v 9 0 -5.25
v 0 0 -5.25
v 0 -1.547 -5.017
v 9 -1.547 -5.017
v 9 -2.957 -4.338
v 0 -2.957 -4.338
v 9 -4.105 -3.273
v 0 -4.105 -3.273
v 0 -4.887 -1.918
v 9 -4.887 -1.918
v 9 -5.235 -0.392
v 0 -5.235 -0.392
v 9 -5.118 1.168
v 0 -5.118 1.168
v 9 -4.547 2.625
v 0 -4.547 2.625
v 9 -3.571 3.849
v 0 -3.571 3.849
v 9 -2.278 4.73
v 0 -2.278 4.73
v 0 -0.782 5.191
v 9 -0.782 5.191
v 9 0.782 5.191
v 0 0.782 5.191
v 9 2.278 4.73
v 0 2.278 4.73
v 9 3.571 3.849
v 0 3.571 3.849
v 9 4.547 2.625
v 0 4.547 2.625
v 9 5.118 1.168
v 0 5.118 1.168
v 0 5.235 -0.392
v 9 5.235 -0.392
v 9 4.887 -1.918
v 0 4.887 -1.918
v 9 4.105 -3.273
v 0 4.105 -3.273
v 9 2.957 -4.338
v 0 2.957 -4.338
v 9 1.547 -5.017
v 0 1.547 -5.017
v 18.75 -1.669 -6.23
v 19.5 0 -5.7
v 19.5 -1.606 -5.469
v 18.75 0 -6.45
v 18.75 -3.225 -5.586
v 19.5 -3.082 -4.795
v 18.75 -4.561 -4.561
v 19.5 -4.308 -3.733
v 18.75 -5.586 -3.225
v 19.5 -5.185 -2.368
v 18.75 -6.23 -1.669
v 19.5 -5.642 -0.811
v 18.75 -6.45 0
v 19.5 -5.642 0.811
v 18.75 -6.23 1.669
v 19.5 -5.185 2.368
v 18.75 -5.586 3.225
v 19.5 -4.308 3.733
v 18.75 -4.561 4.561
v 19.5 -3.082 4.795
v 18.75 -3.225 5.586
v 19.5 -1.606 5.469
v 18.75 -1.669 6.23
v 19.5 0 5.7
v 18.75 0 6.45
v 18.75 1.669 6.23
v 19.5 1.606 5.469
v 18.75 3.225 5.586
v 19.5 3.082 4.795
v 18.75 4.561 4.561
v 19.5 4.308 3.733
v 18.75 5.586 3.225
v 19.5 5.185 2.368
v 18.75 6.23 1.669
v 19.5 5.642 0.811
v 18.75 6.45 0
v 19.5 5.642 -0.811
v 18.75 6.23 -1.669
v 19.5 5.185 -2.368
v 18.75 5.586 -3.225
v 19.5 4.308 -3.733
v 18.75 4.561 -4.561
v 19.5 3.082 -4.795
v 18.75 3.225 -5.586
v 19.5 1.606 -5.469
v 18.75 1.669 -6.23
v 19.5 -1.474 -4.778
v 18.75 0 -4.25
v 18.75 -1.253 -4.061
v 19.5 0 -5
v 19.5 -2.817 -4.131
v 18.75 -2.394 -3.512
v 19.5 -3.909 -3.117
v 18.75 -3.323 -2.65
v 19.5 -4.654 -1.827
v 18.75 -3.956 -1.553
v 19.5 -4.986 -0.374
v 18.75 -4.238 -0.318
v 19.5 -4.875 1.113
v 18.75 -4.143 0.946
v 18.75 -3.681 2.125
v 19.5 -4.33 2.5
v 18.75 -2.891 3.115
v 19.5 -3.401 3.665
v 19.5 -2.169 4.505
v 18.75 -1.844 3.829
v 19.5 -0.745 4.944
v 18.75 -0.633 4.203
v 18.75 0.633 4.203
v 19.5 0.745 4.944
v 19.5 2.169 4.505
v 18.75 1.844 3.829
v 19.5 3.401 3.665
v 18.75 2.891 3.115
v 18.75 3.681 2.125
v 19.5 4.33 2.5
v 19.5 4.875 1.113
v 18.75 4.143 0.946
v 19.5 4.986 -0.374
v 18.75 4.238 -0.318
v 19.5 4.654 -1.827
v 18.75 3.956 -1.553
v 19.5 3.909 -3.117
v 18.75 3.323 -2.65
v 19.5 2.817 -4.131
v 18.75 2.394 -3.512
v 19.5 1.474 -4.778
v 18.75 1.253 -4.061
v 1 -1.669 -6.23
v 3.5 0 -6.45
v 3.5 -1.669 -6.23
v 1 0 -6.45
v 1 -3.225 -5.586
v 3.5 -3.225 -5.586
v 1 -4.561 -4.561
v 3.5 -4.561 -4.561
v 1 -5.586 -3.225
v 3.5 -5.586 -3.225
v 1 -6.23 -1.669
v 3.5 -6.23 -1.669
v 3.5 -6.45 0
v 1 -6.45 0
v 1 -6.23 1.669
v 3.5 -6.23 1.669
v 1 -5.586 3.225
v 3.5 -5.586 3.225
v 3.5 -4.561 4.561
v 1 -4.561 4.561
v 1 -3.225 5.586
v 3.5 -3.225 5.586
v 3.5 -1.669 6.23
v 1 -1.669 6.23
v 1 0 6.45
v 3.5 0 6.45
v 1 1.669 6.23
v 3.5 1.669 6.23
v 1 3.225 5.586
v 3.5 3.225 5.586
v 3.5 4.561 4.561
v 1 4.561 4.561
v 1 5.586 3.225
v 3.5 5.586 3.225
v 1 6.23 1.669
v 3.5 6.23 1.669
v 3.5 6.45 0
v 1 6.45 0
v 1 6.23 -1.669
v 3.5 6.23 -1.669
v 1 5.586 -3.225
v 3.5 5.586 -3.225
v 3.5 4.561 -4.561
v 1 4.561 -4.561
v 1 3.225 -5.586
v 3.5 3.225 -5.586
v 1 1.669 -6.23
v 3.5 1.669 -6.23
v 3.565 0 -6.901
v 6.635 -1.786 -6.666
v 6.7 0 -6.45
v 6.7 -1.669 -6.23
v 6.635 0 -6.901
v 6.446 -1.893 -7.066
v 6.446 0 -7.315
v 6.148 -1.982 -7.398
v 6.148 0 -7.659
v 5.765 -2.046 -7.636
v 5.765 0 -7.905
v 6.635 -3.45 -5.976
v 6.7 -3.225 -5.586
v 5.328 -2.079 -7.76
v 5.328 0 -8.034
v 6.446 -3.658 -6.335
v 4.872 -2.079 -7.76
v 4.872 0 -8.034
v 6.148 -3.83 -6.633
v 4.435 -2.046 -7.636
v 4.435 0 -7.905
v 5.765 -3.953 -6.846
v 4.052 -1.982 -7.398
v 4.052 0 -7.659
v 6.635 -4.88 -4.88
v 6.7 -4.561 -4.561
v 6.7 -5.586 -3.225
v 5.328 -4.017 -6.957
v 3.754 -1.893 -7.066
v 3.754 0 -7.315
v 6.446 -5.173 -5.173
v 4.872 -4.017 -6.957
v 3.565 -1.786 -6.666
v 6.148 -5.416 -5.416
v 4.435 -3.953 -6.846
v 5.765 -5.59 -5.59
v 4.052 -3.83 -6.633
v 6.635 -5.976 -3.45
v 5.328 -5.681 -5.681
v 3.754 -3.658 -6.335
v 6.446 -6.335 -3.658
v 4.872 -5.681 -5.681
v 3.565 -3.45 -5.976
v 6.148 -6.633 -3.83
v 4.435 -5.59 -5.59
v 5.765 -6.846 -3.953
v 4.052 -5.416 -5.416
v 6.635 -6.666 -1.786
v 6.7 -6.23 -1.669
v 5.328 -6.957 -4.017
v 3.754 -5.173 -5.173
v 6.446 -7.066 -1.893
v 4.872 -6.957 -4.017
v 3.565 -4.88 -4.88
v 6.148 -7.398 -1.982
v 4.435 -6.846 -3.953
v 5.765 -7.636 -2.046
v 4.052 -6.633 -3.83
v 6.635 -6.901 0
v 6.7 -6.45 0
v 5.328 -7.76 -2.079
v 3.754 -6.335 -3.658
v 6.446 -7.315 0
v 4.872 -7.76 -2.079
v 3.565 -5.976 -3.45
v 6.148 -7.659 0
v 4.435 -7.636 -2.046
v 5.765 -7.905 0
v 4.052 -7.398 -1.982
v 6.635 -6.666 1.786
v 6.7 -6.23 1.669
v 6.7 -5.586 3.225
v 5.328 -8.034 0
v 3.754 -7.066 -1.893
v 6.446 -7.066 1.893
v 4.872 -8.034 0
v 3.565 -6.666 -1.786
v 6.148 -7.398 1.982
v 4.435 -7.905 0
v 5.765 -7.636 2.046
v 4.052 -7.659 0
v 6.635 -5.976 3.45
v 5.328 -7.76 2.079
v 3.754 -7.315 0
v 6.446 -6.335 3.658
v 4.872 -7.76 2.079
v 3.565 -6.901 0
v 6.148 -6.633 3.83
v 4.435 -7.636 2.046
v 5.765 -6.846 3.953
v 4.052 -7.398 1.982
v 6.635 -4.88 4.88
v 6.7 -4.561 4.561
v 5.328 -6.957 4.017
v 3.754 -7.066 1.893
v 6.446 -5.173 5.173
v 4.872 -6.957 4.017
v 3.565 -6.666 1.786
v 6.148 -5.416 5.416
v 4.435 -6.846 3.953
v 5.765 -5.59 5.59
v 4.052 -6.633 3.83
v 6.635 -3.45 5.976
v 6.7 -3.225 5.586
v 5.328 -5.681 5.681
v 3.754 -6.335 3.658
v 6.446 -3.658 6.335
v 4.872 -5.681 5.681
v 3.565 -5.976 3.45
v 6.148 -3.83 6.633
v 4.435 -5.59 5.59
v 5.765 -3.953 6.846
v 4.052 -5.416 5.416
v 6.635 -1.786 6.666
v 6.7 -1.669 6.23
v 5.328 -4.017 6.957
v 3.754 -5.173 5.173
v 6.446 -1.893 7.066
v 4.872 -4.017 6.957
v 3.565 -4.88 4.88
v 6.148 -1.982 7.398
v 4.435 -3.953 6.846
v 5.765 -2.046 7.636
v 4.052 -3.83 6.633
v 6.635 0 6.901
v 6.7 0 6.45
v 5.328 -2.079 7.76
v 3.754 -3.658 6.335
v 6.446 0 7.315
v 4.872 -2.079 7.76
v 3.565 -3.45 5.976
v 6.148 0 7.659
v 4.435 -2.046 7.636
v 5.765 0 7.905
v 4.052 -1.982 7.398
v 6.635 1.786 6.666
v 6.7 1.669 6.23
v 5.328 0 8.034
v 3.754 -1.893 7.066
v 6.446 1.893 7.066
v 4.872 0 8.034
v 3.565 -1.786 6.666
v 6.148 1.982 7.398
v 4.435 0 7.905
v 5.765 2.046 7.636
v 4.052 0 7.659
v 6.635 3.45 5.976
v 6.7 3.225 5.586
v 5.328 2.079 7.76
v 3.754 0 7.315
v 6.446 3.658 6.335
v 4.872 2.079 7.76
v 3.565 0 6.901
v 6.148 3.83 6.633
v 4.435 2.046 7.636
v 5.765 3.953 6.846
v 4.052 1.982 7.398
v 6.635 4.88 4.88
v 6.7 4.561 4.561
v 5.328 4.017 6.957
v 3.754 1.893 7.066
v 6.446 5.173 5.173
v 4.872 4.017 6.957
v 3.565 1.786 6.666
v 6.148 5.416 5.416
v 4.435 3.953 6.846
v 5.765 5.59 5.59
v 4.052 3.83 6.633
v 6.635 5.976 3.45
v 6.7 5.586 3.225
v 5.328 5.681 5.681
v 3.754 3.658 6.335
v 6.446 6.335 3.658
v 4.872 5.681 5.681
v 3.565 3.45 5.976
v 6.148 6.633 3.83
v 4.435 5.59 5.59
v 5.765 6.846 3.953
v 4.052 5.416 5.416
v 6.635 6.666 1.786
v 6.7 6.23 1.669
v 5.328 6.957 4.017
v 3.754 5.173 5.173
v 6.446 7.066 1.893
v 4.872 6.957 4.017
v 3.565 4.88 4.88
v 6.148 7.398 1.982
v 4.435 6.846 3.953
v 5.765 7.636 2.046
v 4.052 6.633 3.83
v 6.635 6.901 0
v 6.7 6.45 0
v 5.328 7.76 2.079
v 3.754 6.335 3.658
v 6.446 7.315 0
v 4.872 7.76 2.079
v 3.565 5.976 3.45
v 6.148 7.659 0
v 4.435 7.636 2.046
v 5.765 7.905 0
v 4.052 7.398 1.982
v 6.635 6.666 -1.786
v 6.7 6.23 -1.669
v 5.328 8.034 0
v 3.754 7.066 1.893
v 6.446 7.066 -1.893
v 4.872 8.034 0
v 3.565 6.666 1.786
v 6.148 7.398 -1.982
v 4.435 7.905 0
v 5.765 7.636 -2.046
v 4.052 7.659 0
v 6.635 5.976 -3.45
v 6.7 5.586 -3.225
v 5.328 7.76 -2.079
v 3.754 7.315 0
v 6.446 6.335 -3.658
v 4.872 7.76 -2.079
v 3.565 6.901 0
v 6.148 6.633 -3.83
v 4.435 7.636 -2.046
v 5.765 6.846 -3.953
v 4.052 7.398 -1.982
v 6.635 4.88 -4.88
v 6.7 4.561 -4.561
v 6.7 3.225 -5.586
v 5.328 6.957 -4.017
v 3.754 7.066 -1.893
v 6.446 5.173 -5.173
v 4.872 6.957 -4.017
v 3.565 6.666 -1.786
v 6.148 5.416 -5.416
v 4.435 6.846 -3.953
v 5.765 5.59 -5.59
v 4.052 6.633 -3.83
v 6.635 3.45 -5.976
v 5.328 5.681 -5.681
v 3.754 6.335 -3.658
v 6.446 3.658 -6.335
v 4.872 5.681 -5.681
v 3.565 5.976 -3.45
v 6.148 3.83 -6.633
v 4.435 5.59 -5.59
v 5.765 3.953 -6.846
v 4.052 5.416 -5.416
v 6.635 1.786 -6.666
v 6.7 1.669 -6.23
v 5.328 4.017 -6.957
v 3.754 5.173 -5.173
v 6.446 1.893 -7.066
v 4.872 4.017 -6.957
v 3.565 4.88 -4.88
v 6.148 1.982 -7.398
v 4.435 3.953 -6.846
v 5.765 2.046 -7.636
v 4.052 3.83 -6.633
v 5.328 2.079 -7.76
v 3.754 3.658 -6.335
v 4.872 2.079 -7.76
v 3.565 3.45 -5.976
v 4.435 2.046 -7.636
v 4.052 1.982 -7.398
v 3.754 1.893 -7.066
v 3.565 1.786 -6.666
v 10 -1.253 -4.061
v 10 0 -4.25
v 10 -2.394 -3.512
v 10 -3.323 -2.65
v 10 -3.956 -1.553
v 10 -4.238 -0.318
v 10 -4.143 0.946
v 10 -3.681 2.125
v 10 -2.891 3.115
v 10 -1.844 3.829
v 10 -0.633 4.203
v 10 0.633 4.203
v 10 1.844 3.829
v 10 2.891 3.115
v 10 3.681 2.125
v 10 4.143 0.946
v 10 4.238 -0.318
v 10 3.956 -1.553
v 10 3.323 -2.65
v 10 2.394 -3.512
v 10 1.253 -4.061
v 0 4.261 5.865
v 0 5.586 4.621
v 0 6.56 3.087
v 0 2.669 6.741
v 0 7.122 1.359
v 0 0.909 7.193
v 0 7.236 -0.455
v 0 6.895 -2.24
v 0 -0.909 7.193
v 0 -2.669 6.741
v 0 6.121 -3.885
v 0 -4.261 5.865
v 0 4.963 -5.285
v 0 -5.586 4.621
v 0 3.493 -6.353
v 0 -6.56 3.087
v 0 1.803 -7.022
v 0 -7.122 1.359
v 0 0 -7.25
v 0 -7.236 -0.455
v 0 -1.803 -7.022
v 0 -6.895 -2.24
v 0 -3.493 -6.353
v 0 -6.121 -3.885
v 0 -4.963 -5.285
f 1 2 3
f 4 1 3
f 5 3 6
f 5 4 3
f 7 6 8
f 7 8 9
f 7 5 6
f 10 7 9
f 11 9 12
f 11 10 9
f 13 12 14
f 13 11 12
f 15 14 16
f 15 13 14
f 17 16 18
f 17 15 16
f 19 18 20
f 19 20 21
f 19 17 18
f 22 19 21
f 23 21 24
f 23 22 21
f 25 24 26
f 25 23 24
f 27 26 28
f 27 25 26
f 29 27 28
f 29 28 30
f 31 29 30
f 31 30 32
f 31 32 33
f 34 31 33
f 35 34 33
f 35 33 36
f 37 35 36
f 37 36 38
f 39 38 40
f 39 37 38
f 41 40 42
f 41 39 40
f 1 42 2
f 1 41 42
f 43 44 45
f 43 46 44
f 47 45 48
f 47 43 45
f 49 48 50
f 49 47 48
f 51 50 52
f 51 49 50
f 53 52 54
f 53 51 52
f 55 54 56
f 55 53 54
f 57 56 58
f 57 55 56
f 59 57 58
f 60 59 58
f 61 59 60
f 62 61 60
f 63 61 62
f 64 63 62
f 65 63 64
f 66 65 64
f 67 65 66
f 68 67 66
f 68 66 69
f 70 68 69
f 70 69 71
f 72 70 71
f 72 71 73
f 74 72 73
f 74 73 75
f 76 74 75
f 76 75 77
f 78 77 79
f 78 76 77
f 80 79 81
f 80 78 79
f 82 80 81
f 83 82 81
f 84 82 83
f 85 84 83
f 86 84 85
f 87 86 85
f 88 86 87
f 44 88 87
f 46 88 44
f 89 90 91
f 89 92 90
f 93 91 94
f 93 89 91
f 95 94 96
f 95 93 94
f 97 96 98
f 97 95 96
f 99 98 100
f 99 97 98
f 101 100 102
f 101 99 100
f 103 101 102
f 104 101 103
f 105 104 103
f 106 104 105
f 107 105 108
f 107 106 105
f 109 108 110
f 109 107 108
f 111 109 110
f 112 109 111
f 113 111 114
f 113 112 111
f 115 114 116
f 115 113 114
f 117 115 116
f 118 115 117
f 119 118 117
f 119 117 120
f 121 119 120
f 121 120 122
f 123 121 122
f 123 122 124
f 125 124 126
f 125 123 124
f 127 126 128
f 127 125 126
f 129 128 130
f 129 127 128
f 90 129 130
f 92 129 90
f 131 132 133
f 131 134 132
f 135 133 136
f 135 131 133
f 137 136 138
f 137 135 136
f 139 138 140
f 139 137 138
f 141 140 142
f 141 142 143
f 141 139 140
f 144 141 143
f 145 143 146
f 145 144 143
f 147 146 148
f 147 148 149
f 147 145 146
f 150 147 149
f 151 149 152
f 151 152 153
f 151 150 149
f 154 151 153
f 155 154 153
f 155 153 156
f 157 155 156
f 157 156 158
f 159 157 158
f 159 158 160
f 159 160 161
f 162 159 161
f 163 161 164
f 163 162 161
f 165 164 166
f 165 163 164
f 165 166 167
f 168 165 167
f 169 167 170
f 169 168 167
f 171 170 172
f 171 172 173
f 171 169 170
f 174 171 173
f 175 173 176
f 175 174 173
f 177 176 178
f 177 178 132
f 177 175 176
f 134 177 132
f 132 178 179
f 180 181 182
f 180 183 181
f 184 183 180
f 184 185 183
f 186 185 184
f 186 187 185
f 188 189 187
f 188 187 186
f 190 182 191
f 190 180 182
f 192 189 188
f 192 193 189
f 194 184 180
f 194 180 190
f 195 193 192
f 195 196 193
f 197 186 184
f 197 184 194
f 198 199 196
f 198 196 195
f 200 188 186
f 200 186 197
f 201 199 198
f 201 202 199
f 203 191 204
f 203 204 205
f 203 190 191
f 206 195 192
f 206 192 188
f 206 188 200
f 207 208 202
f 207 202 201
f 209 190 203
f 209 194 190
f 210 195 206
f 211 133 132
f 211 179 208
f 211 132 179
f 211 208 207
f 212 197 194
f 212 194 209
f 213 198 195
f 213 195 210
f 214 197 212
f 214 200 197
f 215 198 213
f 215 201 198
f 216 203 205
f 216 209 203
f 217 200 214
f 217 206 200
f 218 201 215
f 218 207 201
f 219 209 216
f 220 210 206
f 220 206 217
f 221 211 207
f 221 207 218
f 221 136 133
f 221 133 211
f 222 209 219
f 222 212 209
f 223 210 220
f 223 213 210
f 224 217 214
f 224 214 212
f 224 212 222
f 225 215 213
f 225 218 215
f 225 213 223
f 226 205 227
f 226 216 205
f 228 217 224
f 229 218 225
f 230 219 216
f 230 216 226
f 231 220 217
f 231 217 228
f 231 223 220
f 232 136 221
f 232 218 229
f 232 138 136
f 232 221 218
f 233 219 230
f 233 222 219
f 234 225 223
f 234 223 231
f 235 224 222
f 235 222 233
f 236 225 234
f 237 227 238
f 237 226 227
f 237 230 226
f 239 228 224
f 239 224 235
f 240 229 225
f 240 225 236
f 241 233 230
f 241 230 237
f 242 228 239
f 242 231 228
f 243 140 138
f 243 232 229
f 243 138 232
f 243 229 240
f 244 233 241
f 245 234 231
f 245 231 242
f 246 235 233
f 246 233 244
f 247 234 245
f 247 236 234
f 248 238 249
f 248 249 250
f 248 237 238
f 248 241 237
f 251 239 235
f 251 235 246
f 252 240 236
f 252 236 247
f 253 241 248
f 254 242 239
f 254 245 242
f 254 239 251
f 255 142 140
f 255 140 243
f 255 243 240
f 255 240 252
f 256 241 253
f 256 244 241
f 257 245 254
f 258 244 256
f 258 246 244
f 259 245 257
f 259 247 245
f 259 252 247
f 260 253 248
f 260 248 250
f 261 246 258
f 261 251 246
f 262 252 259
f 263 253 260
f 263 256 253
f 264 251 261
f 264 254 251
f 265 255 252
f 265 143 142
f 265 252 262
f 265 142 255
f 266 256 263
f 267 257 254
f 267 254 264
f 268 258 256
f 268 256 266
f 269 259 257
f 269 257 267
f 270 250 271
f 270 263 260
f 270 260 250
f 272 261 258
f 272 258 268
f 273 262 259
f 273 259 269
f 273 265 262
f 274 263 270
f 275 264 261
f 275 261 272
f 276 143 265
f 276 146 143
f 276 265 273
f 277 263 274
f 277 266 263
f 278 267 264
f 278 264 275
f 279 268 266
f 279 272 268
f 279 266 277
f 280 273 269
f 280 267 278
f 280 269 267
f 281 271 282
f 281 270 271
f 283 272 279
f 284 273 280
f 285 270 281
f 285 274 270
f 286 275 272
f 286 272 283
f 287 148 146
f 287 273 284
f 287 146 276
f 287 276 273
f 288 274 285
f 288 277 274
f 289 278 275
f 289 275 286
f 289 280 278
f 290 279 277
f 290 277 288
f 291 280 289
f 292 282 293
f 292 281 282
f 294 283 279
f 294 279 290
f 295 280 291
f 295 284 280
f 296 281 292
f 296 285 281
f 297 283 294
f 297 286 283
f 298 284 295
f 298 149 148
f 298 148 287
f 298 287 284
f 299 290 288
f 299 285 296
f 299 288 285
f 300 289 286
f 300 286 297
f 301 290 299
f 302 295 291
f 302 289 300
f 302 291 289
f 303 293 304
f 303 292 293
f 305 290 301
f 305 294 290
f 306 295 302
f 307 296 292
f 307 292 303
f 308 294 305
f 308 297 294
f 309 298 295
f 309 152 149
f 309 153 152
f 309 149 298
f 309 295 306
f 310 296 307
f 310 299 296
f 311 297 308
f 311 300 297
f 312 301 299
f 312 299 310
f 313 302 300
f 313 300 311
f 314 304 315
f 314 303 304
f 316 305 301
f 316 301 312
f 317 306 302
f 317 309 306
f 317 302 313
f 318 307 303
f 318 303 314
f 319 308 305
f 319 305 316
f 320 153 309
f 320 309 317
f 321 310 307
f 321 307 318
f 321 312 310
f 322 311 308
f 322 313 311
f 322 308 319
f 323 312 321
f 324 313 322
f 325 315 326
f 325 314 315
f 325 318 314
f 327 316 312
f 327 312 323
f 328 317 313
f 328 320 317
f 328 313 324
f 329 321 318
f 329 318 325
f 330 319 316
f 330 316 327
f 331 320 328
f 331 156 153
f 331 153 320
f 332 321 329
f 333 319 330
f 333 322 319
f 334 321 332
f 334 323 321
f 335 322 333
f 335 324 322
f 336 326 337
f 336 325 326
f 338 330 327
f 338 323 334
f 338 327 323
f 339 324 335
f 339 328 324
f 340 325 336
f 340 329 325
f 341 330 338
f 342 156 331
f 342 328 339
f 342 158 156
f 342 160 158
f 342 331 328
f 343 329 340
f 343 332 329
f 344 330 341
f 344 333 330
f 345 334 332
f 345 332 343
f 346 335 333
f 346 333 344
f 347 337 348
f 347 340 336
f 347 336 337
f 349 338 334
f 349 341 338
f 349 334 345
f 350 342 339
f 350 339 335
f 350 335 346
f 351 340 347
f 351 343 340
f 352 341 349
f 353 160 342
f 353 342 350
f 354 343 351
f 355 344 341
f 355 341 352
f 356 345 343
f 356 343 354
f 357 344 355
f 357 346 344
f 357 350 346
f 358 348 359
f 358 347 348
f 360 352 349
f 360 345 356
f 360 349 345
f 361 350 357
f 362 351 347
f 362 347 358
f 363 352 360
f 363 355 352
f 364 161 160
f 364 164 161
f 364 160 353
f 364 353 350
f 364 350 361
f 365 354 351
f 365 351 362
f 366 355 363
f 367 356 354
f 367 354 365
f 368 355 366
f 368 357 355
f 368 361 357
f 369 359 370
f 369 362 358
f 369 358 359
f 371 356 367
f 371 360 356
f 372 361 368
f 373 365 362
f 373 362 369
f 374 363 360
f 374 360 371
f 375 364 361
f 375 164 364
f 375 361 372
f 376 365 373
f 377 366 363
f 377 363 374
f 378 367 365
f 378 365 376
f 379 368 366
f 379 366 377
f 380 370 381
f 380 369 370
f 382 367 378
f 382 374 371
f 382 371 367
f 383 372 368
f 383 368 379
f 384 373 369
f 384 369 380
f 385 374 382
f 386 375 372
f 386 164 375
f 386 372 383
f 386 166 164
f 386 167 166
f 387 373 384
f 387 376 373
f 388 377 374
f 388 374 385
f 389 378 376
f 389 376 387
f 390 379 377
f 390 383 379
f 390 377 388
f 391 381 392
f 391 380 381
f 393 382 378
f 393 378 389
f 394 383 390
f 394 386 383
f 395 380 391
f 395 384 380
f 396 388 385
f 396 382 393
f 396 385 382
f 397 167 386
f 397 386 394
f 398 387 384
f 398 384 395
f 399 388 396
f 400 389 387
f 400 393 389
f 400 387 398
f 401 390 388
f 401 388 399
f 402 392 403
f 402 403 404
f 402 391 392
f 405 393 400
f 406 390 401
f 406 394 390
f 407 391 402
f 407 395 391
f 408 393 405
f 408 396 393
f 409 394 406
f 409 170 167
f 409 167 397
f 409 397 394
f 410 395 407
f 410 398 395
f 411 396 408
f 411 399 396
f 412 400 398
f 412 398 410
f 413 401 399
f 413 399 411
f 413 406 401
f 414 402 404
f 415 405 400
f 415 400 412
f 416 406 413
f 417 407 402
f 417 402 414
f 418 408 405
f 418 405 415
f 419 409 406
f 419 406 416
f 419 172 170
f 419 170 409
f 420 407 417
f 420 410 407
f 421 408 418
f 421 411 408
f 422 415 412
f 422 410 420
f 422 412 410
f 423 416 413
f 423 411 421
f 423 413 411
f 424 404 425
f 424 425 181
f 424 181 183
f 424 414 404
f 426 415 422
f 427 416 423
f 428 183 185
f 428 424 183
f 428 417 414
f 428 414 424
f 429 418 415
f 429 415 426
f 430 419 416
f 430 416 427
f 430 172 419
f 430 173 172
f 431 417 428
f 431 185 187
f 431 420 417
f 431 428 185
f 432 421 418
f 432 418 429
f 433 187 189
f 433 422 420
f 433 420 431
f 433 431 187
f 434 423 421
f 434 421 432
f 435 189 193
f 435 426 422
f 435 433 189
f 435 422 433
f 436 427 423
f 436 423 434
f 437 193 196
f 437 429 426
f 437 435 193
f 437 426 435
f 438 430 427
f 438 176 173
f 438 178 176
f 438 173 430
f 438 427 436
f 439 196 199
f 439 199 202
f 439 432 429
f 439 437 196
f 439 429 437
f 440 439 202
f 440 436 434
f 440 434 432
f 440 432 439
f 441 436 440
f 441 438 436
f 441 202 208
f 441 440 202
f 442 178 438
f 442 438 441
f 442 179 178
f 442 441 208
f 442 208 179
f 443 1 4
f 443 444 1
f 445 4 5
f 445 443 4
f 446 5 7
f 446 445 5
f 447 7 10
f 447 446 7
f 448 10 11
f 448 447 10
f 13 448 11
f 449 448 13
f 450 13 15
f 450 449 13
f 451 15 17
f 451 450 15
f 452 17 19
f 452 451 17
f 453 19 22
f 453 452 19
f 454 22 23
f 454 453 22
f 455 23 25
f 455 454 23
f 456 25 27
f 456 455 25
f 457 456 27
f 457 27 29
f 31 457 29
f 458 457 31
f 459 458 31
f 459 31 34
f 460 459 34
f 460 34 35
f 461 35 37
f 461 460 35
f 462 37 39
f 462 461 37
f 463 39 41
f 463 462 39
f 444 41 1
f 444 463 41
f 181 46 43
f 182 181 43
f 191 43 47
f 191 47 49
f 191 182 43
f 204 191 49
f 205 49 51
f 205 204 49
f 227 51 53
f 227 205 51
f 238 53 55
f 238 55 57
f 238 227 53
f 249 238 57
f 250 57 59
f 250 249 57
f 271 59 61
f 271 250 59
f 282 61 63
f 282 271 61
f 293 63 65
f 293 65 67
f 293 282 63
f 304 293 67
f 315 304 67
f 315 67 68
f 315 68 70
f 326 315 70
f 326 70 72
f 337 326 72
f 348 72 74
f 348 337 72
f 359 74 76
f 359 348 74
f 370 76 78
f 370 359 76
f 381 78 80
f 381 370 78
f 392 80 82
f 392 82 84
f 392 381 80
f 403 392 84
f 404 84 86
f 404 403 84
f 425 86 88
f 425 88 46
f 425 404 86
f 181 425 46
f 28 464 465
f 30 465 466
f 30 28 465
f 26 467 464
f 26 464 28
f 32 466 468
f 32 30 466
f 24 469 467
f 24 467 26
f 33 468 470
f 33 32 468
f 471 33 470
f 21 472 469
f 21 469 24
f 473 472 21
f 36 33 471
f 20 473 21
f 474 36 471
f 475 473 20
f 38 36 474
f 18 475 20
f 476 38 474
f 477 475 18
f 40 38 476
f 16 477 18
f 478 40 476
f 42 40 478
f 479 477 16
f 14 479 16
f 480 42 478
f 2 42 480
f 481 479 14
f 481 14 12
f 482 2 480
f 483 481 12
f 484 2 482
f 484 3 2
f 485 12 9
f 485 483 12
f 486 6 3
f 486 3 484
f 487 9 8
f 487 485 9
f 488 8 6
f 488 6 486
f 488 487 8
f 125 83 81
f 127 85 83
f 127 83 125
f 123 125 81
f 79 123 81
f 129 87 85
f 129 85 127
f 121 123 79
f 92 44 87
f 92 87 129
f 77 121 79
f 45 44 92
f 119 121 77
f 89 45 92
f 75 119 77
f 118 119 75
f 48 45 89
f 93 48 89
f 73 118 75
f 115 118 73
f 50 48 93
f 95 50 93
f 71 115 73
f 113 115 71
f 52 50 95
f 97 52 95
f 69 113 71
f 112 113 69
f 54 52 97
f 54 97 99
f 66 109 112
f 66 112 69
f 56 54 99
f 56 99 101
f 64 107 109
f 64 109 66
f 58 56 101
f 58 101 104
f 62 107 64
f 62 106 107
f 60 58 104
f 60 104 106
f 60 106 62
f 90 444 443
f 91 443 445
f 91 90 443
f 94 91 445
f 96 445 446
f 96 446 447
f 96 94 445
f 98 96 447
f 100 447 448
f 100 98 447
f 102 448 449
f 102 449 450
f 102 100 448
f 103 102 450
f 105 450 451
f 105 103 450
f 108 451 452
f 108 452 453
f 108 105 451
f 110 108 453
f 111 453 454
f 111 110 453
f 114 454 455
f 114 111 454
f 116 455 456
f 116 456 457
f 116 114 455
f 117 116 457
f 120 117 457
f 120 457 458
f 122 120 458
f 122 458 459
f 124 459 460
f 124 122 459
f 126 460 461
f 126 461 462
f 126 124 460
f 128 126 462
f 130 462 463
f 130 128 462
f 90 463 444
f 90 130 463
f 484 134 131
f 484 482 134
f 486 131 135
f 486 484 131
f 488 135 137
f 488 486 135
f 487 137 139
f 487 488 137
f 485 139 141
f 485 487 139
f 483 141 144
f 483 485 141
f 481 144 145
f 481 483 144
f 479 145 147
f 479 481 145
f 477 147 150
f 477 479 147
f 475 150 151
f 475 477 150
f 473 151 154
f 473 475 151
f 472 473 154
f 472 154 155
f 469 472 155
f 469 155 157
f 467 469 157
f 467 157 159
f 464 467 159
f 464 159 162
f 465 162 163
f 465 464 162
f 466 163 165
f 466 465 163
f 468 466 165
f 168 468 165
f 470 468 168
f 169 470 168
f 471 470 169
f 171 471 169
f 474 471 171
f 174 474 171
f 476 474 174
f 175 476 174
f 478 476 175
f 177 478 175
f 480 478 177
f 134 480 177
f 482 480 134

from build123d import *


with BuildPart() as part:
    # Эскиз1 → Повернуть1 (revolve)
    with BuildSketch(Plane.XY, mode=Mode.PRIVATE) as revolve_1_sk:
        with BuildLine():
            Line((0, 7.25), (0, 5.25))
            Line((0, 5.25), (9, 5.25))
            Line((9, 5.25), (10, 4.25))
            Line((10, 4.25), (18.75, 4.25))
            Line((18.75, 4.25), (19.5, 5))
            Line((19.5, 5), (19.5, 5.7))
            Line((19.5, 5.7), (18.75, 6.45))
            Line((18.75, 6.45), (6.7, 6.45))
            ThreePointArc((6.7, 6.45), (5.1, 8.05), (3.5, 6.45))
            Line((3.5, 6.45), (1, 6.45))
            Line((1, 6.45), (0, 7.25))
        make_face()
    revolve(revolve_1_sk.sketch.rotate(Axis((0, 0, 0), (-1, 0, 0)), 90), axis=Axis((0, 0, 0), (-1, 0, 0)))


solid = part.part
